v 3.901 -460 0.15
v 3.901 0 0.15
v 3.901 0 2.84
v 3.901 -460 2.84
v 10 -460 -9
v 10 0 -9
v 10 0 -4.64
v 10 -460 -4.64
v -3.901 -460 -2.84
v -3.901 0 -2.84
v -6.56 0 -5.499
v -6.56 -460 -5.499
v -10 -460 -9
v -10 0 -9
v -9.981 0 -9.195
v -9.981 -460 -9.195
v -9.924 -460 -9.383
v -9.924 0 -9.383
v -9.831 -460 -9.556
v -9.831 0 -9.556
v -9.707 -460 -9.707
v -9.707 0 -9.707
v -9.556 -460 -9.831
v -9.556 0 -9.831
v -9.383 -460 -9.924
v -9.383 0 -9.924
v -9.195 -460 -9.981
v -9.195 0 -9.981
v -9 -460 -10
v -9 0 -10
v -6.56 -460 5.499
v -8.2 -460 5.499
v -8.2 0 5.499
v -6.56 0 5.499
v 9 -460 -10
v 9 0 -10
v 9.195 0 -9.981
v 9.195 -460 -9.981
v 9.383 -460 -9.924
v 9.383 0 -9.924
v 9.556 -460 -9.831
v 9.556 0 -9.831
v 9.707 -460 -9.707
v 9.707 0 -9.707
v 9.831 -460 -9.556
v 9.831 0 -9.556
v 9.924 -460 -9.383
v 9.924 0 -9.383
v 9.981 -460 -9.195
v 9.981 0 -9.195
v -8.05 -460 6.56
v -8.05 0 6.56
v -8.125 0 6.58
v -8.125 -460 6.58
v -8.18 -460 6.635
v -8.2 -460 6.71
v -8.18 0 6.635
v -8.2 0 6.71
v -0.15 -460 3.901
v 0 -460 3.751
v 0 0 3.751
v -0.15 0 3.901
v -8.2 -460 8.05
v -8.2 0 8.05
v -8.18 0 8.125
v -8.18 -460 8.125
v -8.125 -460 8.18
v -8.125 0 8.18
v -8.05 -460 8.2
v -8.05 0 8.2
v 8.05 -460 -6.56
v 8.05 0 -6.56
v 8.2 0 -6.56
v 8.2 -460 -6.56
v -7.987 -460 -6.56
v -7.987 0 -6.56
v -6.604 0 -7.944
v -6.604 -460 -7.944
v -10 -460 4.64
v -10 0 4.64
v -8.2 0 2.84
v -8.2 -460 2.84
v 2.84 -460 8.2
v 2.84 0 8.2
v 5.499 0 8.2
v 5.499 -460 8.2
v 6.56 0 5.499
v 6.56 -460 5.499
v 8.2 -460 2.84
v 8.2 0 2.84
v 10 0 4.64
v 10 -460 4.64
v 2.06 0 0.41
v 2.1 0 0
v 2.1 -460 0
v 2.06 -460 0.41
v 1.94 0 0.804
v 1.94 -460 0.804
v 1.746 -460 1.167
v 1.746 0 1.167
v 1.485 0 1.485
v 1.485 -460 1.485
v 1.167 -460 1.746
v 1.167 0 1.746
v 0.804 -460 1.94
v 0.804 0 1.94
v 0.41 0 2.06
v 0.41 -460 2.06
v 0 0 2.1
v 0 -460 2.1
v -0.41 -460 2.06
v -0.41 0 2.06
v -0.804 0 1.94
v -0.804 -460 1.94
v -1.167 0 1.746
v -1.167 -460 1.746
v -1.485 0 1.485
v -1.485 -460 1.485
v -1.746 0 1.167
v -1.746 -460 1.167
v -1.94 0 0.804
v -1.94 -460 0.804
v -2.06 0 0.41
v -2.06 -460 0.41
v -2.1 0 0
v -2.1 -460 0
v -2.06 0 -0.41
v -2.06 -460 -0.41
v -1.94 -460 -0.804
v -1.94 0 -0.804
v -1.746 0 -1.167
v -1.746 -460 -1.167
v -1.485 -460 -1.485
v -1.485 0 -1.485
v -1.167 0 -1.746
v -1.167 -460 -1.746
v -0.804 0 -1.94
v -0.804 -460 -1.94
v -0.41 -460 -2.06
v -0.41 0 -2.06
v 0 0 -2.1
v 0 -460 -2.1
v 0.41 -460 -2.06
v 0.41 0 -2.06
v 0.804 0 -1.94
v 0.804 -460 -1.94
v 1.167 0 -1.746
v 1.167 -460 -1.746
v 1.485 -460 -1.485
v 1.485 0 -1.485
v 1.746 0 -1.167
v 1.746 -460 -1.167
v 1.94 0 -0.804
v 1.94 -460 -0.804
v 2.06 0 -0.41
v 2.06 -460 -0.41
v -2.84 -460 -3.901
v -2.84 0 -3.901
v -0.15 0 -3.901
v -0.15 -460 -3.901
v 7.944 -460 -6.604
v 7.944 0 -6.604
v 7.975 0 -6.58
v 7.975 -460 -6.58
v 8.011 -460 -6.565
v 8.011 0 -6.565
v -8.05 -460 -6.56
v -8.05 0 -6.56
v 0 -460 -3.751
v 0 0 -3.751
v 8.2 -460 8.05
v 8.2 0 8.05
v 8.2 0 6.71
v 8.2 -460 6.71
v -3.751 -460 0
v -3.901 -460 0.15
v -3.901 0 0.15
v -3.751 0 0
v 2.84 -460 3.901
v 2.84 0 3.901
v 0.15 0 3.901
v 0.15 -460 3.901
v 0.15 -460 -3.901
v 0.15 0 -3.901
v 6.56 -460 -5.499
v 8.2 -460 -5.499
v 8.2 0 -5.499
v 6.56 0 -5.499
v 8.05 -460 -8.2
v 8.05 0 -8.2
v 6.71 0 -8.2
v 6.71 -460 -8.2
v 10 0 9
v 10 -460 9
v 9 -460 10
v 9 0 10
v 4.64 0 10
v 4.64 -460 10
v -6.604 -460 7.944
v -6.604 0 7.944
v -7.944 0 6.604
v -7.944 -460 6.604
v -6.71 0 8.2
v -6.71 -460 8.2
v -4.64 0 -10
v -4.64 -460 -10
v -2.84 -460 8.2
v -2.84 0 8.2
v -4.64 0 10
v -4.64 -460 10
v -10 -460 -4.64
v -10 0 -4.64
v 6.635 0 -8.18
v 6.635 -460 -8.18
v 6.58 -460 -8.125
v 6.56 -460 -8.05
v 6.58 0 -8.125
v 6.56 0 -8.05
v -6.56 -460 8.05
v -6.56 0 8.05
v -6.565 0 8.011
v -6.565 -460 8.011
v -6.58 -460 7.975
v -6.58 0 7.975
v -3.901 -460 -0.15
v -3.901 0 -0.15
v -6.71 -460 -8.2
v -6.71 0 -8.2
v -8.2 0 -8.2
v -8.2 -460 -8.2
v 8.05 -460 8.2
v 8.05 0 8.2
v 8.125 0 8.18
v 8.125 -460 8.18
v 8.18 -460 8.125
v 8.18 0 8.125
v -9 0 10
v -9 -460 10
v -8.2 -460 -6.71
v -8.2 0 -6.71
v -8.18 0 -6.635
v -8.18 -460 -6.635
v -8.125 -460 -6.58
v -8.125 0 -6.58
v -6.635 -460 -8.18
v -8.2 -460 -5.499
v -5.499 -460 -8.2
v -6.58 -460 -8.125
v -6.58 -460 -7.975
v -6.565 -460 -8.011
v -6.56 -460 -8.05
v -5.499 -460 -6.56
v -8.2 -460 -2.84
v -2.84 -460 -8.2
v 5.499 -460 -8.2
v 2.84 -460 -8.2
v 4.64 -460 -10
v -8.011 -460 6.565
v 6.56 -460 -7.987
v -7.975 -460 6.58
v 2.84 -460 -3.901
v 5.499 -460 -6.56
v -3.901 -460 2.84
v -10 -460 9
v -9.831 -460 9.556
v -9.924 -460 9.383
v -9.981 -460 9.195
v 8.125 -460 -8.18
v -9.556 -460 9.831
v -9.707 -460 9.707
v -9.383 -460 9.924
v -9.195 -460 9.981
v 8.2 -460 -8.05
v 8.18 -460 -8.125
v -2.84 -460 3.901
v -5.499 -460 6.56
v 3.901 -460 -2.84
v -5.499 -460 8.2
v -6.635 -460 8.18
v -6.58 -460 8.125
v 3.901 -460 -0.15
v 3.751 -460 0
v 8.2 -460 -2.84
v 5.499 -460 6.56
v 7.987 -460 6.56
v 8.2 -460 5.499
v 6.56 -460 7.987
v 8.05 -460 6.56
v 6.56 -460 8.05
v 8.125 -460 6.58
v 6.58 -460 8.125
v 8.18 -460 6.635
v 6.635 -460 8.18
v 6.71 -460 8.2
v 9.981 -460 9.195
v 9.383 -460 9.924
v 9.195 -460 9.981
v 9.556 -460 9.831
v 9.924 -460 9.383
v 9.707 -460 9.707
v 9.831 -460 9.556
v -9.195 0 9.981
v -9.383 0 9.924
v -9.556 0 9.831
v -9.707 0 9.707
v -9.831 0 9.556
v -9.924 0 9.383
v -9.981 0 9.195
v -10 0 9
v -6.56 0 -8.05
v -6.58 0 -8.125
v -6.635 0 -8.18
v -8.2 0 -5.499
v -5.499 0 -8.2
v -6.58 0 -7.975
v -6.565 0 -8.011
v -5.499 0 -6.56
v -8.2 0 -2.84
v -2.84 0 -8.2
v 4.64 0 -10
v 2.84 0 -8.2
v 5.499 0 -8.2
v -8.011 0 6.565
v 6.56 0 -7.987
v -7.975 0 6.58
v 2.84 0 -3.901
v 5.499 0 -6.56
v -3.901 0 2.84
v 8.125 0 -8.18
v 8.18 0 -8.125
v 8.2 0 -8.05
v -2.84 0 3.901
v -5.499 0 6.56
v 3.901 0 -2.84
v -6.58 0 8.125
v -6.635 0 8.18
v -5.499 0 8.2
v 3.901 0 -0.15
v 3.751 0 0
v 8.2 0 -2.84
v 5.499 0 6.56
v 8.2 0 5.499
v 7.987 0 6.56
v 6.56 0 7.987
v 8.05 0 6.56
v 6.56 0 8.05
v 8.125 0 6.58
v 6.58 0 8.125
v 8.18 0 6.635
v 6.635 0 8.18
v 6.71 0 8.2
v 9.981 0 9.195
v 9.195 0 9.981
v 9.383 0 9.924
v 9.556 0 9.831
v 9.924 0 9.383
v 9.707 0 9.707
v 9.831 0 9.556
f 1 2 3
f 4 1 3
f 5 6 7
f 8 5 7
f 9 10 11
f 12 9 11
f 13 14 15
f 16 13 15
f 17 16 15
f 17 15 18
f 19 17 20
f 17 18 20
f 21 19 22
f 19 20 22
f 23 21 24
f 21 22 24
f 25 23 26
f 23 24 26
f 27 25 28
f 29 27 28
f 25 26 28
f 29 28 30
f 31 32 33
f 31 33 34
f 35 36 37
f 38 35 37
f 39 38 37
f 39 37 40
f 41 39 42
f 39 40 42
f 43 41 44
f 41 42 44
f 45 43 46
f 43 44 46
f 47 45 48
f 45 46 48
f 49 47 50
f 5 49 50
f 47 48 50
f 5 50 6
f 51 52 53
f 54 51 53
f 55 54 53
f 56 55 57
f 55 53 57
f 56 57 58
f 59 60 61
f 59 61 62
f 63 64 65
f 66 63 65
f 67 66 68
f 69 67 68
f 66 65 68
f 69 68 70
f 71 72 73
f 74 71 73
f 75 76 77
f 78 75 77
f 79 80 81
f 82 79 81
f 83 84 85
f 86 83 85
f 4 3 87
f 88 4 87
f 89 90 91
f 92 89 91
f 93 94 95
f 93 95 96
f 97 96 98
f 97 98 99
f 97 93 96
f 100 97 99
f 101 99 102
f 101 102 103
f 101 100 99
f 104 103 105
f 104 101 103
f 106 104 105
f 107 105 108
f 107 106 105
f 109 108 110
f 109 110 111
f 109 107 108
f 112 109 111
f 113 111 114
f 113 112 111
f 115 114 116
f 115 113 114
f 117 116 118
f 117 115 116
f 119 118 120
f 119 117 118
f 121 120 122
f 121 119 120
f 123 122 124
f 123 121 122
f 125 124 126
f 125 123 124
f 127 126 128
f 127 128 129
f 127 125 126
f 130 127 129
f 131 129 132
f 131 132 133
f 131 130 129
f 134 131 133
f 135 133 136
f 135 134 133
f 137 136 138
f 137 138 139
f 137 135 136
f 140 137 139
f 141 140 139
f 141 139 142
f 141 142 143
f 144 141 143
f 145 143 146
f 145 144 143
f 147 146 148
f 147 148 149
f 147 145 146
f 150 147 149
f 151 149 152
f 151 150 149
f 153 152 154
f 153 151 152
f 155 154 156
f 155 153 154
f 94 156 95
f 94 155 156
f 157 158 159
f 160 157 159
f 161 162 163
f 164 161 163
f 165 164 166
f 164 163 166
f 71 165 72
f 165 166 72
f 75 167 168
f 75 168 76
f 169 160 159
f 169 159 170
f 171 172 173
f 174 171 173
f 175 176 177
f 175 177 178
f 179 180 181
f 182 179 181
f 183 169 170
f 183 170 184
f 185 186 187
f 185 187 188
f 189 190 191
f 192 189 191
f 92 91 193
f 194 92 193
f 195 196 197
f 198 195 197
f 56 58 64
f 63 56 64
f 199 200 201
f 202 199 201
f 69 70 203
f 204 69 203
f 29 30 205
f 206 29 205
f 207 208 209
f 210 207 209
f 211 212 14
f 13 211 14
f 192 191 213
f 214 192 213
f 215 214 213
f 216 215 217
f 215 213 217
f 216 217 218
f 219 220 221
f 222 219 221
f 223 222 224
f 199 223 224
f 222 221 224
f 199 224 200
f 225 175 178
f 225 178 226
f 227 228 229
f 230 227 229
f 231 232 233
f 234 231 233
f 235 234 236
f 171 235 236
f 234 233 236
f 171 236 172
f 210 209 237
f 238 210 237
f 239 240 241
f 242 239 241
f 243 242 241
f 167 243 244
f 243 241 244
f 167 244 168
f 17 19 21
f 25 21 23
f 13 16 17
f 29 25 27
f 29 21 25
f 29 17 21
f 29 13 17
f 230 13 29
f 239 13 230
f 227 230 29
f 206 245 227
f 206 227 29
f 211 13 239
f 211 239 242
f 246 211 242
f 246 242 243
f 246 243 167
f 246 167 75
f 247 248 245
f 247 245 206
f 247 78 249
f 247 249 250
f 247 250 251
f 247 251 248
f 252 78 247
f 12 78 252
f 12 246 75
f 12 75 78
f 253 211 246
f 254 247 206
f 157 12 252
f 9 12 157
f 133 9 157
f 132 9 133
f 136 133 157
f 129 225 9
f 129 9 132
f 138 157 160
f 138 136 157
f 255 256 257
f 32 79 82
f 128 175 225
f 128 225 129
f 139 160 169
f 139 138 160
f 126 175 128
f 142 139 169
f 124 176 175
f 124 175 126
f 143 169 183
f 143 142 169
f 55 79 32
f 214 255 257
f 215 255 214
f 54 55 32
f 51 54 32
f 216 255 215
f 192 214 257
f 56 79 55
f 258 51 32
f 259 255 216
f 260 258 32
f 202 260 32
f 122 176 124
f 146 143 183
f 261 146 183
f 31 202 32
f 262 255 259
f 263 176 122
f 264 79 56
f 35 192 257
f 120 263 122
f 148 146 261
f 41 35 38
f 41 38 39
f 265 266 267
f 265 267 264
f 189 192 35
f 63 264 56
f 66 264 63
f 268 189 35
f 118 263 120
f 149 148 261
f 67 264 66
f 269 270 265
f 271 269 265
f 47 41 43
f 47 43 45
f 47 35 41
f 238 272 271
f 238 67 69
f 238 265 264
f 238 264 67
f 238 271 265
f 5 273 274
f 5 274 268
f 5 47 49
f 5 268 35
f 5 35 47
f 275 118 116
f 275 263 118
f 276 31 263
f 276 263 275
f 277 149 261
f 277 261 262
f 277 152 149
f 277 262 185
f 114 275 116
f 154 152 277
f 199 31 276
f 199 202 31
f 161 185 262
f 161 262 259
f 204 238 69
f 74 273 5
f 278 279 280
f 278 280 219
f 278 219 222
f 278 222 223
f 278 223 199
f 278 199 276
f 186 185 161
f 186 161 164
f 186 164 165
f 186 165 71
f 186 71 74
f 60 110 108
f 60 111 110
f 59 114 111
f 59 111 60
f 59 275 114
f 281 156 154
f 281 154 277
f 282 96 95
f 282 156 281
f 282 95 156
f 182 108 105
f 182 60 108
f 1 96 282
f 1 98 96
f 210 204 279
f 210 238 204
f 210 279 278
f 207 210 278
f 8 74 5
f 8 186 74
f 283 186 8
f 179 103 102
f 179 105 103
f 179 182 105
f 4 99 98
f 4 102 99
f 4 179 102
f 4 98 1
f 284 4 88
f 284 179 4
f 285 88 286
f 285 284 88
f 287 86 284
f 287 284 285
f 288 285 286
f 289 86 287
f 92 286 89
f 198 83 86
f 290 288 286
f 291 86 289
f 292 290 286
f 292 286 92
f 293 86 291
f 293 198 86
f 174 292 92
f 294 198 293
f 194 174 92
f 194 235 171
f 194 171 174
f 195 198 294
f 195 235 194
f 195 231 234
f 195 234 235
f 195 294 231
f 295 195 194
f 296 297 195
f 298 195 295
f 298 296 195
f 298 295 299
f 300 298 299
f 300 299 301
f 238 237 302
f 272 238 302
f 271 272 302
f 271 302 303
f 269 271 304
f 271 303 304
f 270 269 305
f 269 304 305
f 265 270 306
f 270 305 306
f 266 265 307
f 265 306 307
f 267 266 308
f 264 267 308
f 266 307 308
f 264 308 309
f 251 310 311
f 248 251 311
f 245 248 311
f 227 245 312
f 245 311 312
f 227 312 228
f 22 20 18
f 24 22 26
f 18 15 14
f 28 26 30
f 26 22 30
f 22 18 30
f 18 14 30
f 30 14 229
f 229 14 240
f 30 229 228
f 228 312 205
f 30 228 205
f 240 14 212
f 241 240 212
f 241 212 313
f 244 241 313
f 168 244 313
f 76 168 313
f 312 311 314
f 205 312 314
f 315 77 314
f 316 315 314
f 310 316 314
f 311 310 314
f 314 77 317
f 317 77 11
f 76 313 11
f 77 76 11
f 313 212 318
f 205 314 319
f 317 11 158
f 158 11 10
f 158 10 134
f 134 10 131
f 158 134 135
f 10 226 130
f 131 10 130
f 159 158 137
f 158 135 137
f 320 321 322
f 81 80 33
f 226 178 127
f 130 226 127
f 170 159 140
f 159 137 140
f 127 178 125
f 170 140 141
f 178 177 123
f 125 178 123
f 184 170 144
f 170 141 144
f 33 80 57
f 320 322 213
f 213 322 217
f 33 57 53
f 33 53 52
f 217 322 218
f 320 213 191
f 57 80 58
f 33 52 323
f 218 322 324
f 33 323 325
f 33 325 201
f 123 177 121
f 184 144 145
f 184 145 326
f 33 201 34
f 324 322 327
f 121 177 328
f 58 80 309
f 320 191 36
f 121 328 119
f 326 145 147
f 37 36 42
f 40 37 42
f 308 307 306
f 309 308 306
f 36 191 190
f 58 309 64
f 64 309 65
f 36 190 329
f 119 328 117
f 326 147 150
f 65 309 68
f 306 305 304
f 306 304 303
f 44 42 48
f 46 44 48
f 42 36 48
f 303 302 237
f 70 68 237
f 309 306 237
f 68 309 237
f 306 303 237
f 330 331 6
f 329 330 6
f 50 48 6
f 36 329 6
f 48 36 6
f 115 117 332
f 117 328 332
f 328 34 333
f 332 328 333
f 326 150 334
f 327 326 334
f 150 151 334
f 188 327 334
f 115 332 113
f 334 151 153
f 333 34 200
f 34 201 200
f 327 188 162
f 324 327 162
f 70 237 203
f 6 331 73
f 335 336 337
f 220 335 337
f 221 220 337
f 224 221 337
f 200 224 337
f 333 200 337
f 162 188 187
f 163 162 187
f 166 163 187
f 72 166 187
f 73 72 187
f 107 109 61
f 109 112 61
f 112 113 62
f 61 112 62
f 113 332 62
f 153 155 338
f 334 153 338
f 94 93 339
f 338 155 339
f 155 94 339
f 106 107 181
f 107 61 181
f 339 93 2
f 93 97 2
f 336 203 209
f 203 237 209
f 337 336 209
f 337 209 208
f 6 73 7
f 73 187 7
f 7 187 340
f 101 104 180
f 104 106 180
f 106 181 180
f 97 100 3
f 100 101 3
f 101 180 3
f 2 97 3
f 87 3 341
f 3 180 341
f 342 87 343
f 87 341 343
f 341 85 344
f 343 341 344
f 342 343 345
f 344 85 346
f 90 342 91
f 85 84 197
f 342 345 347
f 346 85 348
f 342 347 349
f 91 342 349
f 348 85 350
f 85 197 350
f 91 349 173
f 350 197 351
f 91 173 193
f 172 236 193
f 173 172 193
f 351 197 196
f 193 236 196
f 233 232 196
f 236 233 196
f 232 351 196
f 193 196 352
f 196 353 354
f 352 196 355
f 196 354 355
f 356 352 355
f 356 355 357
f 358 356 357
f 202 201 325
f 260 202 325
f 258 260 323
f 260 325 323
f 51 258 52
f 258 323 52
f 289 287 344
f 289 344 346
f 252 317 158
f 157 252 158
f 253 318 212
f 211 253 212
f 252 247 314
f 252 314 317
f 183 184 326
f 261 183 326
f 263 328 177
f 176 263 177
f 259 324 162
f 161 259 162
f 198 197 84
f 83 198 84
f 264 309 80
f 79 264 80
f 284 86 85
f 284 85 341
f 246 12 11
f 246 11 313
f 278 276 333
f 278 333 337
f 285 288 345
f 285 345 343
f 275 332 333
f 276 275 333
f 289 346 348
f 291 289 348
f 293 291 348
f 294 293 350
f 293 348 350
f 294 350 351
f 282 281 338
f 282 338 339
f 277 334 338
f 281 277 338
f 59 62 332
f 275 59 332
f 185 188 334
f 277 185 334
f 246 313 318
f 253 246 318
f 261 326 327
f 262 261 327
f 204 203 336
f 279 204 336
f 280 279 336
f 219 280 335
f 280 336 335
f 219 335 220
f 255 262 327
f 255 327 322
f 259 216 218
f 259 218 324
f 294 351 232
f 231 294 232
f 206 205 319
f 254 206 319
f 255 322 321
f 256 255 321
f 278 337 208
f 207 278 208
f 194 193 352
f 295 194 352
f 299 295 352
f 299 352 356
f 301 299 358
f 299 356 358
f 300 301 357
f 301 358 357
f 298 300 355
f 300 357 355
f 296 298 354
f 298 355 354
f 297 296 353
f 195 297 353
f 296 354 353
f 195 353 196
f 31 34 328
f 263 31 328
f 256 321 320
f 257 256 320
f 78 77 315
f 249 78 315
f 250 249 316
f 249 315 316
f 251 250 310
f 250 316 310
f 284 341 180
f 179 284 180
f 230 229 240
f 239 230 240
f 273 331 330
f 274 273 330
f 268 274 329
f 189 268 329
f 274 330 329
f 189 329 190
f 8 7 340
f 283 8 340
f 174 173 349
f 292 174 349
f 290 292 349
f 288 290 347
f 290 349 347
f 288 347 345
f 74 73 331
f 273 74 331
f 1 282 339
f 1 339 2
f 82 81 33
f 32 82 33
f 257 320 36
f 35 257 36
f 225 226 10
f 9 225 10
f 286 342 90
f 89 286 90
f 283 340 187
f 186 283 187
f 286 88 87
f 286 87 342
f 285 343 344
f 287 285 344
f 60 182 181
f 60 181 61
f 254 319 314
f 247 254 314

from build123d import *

# Parameters (mm, degrees)
F0_R     = 2.1
F1_DEPTH = 460


with BuildPart() as f1:
    # F0 (on Front) → F1 (new body)
    with BuildSketch(Plane.XZ):
        with BuildLine():
            Line((-4.64, 10), (-9, 10))
            ThreePointArc((-9, 10), (-9.707107, 9.707107), (-10, 9))
            Line((-10, 9), (-10, 4.64))
            Line((-10, 4.64), (-8.2, 2.84))
            Line((-8.2, 2.84), (-8.2, 5.49934))
            Line((-8.2, 5.49934), (-6.56, 5.49934))
            Line((-6.56, 5.49934), (-3.90066, 2.84))
            Line((-3.90066, 2.84), (-3.90066, 0.15))
            Line((-3.90066, 0.15), (-3.75066, 0))
            Line((-3.75066, 0), (-3.90066, -0.15))
            Line((-3.90066, -0.15), (-3.90066, -2.84))
            Line((-3.90066, -2.84), (-6.56, -5.49934))
            Line((-6.56, -5.49934), (-8.2, -5.49934))
            Line((-8.2, -5.49934), (-8.2, -2.84))
            Line((-8.2, -2.84), (-10, -4.64))
            Line((-10, -4.64), (-10, -9))
            ThreePointArc((-10, -9), (-9.707107, -9.707107), (-9, -10))
            Line((-9, -10), (-4.64, -10))
            Line((-4.64, -10), (-2.84, -8.2))
            Line((-2.84, -8.2), (-5.49934, -8.2))
            Line((-5.49934, -8.2), (-5.49934, -6.56))
            Line((-5.49934, -6.56), (-2.84, -3.90066))
            Line((-2.84, -3.90066), (-0.15, -3.90066))
            Line((-0.15, -3.90066), (0, -3.75066))
            Line((0, -3.75066), (0.15, -3.90066))
            Line((0.15, -3.90066), (2.84, -3.90066))
            Line((2.84, -3.90066), (5.49934, -6.56))
            Line((5.49934, -6.56), (5.49934, -8.2))
            Line((5.49934, -8.2), (2.84, -8.2))
            Line((2.84, -8.2), (4.64, -10))
            Line((4.64, -10), (9, -10))
            ThreePointArc((9, -10), (9.707107, -9.707107), (10, -9))
            Line((10, -9), (10, -4.64))
            Line((10, -4.64), (8.2, -2.84))
            Line((8.2, -2.84), (8.2, -5.49934))
            Line((8.2, -5.49934), (6.56, -5.49934))
            Line((6.56, -5.49934), (3.90066, -2.84))
            Line((3.90066, -2.84), (3.90066, -0.15))
            Line((3.90066, -0.15), (3.75066, 0))
            Line((3.75066, 0), (3.90066, 0.15))
            Line((3.90066, 0.15), (3.90066, 2.84))
            Line((3.90066, 2.84), (6.56, 5.49934))
            Line((6.56, 5.49934), (8.2, 5.49934))
            Line((8.2, 5.49934), (8.2, 2.84))
            Line((8.2, 2.84), (10, 4.64))
            Line((10, 4.64), (10, 9))
            ThreePointArc((10, 9), (9.707107, 9.707107), (9, 10))
            Line((9, 10), (4.64, 10))
            Line((4.64, 10), (2.84, 8.2))
            Line((2.84, 8.2), (5.49934, 8.2))
            Line((5.49934, 8.2), (5.49934, 6.56))
            Line((5.49934, 6.56), (2.84, 3.90066))
            Line((2.84, 3.90066), (0.15, 3.90066))
            Line((0.15, 3.90066), (0, 3.75066))
            Line((0, 3.75066), (-0.15, 3.90066))
            Line((-0.15, 3.90066), (-2.84, 3.90066))
            Line((-2.84, 3.90066), (-5.49934, 6.56))
            Line((-5.49934, 6.56), (-5.49934, 8.2))
            Line((-5.49934, 8.2), (-2.84, 8.2))
            Line((-2.84, 8.2), (-4.64, 10))
        make_face()
        with BuildLine():
            Line((-8.2, -8.2), (-8.2, -6.71))
            ThreePointArc((-8.2, -6.71), (-8.156066, -6.603934), (-8.05, -6.56))
            Line((-8.05, -6.56), (-7.98749, -6.56))
            Line((-7.98749, -6.56), (-6.603934, -7.943556))
            ThreePointArc((-6.603934, -7.943556), (-6.571418, -7.992219), (-6.56, -8.049622))
            Line((-6.56, -8.049622), (-6.56, -8.05))
            ThreePointArc((-6.56, -8.05), (-6.603934, -8.156066), (-6.71, -8.2))
            Line((-6.71, -8.2), (-8.2, -8.2))
        make_face(mode=Mode.SUBTRACT)
        with BuildLine():
            ThreePointArc((6.71, -8.2), (6.603934, -8.156066), (6.56, -8.05))
            Line((6.56, -8.05), (6.56, -7.98749))
            Line((6.56, -7.98749), (7.943556, -6.603934))
            ThreePointArc((7.943556, -6.603934), (7.992219, -6.571418), (8.049622, -6.56))
            Line((8.049622, -6.56), (8.2, -6.56))
            Line((8.2, -6.56), (8.2, -8.05))
            ThreePointArc((8.2, -8.05), (8.156066, -8.156066), (8.05, -8.2))
            Line((8.05, -8.2), (6.71, -8.2))
        make_face(mode=Mode.SUBTRACT)
        with BuildLine():
            ThreePointArc((-8.2, 8.05), (-8.156066, 8.156066), (-8.05, 8.2))
            Line((-8.05, 8.2), (-6.71, 8.2))
            ThreePointArc((-6.71, 8.2), (-6.603934, 8.156066), (-6.56, 8.05))
            Line((-6.56, 8.05), (-6.56, 8.049622))
            ThreePointArc((-6.56, 8.049622), (-6.571418, 7.992219), (-6.603934, 7.943556))
            Line((-6.603934, 7.943556), (-7.943556, 6.603934))
            ThreePointArc((-7.943556, 6.603934), (-7.992219, 6.571418), (-8.049622, 6.56))
            Line((-8.049622, 6.56), (-8.05, 6.56))
            ThreePointArc((-8.05, 6.56), (-8.156066, 6.603934), (-8.2, 6.71))
            Line((-8.2, 6.71), (-8.2, 8.05))
        make_face(mode=Mode.SUBTRACT)
        Circle(F0_R, mode=Mode.SUBTRACT)
        with BuildLine():
            Line((8.2, 8.05), (8.2, 6.71))
            ThreePointArc((8.2, 6.71), (8.156066, 6.603934), (8.05, 6.56))
            Line((8.05, 6.56), (7.98749, 6.56))
            Line((7.98749, 6.56), (6.56, 7.98749))
            Line((6.56, 7.98749), (6.56, 8.05))
            ThreePointArc((6.56, 8.05), (6.603934, 8.156066), (6.71, 8.2))
            Line((6.71, 8.2), (8.05, 8.2))
            ThreePointArc((8.05, 8.2), (8.156066, 8.156066), (8.2, 8.05))
        make_face(mode=Mode.SUBTRACT)
    extrude(amount=F1_DEPTH)


solid = f1.part
